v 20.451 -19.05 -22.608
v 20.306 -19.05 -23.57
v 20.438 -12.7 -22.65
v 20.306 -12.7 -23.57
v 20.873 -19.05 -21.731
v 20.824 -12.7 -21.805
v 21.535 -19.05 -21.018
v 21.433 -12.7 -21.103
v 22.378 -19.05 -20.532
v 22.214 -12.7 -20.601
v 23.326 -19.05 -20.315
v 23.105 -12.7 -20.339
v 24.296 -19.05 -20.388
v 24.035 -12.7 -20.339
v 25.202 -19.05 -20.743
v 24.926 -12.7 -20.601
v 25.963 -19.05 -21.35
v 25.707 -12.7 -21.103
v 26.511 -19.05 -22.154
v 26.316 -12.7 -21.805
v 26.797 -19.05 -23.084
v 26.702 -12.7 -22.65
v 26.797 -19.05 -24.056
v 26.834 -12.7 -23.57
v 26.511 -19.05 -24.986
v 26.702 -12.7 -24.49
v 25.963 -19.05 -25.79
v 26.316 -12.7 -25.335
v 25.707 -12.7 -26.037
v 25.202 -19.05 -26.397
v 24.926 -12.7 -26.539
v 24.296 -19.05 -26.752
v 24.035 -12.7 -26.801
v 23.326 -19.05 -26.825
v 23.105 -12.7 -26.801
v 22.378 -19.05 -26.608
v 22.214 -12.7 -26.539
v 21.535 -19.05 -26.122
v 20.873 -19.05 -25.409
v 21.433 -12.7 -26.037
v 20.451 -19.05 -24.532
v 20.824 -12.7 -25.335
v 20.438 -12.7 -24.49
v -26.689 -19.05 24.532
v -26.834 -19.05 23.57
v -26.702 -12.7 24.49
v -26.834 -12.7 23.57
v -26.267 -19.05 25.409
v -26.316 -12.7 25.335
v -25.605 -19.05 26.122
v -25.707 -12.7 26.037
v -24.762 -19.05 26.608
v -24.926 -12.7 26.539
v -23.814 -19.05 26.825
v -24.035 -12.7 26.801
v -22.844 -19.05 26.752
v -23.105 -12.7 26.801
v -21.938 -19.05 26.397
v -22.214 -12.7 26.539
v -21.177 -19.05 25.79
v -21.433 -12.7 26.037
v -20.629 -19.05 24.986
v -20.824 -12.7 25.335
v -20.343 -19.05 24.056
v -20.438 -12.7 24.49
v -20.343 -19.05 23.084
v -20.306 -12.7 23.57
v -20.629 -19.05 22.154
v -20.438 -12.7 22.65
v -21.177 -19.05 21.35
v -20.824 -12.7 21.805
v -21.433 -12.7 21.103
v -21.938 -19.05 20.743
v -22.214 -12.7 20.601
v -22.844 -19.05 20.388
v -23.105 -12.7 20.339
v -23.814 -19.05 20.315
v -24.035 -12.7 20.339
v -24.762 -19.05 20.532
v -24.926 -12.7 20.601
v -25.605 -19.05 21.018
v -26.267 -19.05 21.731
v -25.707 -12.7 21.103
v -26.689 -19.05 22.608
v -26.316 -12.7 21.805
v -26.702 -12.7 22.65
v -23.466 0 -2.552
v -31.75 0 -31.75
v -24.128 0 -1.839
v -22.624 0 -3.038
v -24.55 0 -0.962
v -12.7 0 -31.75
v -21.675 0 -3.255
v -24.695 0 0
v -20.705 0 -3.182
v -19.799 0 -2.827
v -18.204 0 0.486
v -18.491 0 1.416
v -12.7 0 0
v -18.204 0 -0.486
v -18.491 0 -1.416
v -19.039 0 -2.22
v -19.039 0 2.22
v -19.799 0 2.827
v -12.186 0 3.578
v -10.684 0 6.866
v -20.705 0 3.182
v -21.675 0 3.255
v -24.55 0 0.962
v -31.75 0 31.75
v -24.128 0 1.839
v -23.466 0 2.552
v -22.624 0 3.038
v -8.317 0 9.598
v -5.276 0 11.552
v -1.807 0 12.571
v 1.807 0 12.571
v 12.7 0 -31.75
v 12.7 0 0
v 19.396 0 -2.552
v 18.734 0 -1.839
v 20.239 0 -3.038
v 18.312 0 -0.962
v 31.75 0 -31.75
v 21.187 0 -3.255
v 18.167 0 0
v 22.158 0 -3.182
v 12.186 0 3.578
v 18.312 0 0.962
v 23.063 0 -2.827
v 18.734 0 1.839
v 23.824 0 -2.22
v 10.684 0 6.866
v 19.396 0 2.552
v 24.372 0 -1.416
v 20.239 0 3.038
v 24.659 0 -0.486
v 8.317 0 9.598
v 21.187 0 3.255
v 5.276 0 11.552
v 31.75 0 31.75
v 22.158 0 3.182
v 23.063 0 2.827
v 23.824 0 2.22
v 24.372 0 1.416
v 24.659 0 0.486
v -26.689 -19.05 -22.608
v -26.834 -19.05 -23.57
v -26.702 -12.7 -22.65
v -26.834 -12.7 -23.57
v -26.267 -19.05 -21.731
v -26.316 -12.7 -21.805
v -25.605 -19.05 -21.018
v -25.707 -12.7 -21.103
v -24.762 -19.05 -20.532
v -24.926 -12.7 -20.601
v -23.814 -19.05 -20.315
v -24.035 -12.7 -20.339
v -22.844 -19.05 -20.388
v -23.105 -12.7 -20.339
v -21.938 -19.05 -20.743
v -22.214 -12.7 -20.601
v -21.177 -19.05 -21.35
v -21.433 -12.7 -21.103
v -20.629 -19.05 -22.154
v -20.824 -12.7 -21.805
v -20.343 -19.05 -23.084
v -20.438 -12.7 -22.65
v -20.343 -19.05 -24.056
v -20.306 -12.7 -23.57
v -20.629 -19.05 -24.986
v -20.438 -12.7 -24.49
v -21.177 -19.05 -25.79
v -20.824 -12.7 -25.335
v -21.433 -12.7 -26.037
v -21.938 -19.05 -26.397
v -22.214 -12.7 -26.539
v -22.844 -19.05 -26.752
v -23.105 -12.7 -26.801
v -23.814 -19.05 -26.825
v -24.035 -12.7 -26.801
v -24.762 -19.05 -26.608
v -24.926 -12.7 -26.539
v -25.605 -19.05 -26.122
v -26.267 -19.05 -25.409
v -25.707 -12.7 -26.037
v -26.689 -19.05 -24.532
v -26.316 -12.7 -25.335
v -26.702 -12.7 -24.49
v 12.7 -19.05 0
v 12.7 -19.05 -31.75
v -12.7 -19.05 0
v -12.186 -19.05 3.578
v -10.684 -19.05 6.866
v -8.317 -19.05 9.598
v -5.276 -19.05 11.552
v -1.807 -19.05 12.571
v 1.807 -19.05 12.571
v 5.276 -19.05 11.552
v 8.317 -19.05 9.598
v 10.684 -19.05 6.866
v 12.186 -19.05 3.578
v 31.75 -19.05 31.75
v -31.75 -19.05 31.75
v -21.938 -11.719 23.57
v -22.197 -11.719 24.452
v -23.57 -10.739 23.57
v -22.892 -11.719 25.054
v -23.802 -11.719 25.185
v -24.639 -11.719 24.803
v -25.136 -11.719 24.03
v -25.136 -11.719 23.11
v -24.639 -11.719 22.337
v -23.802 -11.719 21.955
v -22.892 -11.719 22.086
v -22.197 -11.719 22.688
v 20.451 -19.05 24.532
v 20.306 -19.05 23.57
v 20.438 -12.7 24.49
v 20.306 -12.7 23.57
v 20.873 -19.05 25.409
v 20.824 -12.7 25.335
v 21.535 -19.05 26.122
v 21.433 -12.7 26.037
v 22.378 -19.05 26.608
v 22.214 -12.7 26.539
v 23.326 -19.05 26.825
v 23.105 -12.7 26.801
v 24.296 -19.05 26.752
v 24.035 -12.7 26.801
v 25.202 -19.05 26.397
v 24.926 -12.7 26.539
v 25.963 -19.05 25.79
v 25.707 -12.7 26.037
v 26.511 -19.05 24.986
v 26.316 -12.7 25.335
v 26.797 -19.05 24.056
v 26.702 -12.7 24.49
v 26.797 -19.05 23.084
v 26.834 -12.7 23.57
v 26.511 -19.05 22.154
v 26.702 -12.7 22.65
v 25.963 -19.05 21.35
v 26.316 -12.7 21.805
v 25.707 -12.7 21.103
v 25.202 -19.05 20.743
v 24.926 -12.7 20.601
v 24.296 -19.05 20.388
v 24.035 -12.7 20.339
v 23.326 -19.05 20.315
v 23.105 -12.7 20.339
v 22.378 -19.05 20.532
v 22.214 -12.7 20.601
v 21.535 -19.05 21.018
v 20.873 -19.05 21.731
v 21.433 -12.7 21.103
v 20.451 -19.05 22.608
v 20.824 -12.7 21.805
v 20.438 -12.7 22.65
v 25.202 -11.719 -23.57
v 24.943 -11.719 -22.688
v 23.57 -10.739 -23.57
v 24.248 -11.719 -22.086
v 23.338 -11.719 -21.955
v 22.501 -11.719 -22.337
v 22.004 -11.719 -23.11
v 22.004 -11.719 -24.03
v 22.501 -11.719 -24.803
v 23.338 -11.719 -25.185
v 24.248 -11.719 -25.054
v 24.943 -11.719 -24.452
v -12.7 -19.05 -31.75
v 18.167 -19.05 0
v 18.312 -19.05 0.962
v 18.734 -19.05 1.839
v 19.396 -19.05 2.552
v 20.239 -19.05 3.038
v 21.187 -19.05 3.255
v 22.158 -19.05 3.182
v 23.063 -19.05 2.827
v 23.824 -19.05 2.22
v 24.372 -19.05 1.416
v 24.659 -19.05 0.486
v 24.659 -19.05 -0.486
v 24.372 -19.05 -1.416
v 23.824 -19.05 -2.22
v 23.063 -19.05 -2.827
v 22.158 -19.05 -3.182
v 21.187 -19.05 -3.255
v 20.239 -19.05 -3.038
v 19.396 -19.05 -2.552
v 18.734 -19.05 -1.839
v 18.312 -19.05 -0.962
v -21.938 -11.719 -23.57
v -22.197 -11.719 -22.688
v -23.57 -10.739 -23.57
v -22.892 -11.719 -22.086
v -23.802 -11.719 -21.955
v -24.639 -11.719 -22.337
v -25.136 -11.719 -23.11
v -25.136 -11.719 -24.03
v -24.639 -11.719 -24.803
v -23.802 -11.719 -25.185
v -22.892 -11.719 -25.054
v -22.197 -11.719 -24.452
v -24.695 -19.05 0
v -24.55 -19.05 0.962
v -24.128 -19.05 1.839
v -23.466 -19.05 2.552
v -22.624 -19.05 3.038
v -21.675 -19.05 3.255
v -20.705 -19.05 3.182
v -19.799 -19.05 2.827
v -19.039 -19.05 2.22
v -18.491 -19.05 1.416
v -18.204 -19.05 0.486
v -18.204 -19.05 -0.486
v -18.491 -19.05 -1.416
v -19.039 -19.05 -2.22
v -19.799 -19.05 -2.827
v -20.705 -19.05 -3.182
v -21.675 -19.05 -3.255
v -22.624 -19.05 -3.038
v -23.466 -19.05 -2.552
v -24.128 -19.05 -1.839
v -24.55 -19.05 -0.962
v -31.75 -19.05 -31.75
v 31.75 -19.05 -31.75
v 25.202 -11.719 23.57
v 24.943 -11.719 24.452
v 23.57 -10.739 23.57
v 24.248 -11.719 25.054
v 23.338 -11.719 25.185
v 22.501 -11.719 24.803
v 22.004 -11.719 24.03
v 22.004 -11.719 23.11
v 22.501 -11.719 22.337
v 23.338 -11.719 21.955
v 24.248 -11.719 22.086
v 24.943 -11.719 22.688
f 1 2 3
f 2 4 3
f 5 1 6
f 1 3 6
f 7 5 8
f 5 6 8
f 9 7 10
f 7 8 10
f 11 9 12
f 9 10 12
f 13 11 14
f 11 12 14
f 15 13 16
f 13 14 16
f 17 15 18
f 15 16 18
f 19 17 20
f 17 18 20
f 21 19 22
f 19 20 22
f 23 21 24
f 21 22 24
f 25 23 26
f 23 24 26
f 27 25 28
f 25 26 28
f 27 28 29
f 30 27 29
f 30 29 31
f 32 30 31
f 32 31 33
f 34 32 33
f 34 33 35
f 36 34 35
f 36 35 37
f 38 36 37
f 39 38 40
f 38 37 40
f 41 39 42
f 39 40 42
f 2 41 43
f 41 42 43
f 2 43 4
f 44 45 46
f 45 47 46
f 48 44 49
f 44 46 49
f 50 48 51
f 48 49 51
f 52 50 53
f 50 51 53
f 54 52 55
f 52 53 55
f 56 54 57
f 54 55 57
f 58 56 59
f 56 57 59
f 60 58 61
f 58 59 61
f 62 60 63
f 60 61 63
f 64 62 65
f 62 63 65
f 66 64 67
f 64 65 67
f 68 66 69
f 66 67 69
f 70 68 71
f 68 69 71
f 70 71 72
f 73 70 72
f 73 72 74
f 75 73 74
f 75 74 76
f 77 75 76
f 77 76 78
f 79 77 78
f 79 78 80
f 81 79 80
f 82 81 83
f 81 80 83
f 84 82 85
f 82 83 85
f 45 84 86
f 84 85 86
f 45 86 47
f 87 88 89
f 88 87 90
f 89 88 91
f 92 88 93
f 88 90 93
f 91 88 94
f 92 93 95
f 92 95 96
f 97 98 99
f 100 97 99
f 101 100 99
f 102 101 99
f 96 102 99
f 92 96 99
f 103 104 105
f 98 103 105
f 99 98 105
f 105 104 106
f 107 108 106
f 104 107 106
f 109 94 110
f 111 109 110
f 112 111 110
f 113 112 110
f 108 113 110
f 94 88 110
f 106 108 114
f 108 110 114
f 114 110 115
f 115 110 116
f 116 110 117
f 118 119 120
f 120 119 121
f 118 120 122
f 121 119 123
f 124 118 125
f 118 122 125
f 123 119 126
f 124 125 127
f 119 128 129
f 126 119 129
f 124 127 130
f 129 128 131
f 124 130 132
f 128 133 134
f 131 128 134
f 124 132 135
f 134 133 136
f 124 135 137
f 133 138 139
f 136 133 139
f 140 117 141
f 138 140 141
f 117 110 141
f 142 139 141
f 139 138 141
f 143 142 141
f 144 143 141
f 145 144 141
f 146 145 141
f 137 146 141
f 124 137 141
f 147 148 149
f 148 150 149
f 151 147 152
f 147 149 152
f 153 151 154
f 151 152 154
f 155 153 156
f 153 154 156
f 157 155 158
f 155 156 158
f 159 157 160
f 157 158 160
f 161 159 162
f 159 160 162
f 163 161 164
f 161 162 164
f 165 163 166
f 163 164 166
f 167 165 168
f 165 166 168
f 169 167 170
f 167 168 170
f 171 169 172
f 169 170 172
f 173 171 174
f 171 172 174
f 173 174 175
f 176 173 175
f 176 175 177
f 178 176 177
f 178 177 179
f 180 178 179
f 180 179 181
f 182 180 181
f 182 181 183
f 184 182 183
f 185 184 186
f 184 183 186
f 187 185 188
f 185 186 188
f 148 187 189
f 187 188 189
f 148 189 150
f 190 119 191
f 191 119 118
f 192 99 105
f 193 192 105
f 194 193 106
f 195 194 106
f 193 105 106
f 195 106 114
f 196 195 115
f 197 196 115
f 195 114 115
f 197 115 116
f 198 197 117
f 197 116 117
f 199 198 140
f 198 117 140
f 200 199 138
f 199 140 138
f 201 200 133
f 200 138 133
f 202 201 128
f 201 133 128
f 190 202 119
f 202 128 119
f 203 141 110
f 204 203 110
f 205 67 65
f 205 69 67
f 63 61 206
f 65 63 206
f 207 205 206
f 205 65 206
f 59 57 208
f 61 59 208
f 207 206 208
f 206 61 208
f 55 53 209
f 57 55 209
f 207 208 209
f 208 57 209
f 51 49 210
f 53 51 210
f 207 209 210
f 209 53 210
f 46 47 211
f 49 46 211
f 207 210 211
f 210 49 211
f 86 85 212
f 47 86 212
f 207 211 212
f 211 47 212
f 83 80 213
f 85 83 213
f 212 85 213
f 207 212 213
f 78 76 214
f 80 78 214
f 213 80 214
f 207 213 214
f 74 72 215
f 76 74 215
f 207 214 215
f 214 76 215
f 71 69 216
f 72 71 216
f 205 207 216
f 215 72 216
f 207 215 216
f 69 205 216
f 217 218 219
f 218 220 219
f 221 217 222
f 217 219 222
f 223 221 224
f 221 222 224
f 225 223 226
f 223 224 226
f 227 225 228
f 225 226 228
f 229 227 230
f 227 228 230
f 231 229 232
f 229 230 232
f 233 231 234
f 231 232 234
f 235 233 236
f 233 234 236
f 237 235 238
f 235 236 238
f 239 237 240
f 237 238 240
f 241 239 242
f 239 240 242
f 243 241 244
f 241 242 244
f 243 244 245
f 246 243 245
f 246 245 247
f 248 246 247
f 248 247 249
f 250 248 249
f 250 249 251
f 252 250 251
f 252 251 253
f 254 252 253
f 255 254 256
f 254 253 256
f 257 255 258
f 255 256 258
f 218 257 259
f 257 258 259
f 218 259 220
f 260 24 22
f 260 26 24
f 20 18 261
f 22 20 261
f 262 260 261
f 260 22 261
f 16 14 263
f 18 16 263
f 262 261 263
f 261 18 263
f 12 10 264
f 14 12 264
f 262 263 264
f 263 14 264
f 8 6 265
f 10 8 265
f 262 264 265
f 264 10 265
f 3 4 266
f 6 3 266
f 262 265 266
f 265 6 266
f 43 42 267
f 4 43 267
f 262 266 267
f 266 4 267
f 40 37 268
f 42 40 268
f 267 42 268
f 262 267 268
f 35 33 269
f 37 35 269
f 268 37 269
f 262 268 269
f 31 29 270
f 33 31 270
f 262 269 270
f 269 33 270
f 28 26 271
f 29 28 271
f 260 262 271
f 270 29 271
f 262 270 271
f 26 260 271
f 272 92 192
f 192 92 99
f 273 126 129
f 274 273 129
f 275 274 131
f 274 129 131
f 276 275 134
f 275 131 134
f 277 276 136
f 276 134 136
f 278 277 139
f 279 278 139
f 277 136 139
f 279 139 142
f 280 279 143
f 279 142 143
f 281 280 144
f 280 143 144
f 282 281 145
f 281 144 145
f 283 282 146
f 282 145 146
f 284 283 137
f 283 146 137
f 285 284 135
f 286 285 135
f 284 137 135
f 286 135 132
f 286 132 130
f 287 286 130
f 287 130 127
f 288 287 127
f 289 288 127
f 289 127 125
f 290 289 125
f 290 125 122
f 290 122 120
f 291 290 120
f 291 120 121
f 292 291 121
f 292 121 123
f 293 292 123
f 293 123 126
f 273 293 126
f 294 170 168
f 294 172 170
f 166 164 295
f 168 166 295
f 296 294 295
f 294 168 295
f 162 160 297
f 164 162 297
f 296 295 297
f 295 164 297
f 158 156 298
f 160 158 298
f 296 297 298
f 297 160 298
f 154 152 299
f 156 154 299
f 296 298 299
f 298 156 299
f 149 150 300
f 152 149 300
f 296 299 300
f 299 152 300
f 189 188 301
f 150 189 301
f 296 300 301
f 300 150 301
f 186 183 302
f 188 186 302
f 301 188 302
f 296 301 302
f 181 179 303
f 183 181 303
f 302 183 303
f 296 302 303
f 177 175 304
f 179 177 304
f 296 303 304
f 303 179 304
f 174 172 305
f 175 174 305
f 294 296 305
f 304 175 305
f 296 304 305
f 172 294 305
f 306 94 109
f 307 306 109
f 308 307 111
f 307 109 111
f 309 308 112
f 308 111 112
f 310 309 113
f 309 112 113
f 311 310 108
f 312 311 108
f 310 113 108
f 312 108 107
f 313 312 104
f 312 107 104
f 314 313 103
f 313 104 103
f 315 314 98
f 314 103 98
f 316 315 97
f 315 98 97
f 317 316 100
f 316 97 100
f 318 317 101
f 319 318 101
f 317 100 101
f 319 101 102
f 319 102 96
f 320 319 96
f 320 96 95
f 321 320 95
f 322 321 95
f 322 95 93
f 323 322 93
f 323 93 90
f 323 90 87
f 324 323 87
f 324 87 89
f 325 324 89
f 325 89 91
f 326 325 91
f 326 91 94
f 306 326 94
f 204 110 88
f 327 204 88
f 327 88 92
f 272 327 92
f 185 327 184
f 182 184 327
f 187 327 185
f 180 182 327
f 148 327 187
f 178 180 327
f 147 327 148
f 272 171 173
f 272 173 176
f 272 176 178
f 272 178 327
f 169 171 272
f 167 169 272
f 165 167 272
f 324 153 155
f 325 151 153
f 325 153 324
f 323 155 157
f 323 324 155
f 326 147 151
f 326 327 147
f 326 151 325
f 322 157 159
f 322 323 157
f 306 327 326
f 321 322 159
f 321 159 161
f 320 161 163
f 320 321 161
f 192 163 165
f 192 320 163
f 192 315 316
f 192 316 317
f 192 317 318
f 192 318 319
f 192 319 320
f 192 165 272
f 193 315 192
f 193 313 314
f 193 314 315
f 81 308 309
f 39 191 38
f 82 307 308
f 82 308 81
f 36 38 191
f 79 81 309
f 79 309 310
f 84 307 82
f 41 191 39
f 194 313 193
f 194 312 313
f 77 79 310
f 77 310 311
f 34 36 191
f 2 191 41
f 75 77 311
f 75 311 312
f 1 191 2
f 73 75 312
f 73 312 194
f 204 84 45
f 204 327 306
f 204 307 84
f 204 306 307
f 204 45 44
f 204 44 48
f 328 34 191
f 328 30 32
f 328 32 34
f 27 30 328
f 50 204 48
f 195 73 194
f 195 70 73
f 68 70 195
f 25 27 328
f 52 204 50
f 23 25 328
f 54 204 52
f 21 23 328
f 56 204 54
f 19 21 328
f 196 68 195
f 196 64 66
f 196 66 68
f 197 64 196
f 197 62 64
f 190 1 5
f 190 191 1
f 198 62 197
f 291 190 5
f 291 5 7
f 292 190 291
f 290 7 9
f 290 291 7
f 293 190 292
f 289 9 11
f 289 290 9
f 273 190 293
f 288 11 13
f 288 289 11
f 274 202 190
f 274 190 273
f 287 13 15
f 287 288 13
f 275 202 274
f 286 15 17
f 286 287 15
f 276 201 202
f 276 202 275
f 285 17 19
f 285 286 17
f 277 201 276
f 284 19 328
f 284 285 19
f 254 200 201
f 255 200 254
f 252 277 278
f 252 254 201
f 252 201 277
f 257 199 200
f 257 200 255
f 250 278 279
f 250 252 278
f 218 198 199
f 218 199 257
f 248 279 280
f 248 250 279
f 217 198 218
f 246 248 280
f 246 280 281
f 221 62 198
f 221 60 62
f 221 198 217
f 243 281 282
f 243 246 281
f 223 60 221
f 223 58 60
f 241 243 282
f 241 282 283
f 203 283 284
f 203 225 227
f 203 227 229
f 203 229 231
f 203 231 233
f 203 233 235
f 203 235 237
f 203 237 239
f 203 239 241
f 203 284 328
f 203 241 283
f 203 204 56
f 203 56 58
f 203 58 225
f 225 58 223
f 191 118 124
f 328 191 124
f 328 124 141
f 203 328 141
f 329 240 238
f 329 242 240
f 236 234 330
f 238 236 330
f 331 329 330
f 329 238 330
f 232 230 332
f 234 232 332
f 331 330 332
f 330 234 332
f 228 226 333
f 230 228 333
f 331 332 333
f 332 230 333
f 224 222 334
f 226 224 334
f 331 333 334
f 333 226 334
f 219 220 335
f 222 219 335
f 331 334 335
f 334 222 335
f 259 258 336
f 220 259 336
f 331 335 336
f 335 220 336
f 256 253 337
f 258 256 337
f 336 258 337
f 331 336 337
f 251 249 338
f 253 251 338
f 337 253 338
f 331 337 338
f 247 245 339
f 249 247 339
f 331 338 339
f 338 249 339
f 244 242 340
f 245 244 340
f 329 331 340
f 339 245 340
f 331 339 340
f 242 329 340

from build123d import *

# Parameters (mm, degrees)
F1_DEPTH = 19.05
F3_D     = 6.5278
F3_DEPTH = 6.35
F3_TIP   = 1.9611489744
F5_D     = 6.5278


with BuildPart() as f1:
    # F0 (on Front) → F1 (new body)
    with BuildSketch(Plane.XZ):
        with BuildLine():
            Line((31.75, 31.75), (-31.75, 31.75))
            Line((-31.75, 31.75), (-31.75, -31.75))
            Line((-31.75, -31.75), (-12.7, -31.75))
            Line((-12.7, -31.75), (-12.7, 0))
            ThreePointArc((-12.7, 0), (0, 12.7), (12.7, 0))
            Line((12.7, 0), (12.7, -31.75))
            Line((12.7, -31.75), (31.75, -31.75))
            Line((31.75, -31.75), (31.75, 31.75))
        make_face()
    extrude(amount=F1_DEPTH)

    # F3
    with Locations(Plane.XZ.offset(19.05)):
        with Locations((-23.57, 23.57), (-23.57, -23.57), (23.57, -23.57), (23.57, 23.57)):
            Hole(F3_D / 2, depth=F3_DEPTH)
            with Locations((0, 0, -(F3_DEPTH + F3_TIP / 2))):  # 118° drill point
                Cone(0, F3_D / 2, F3_TIP, mode=Mode.SUBTRACT)

    # F5 (through all)
    with Locations(Plane.XZ.offset(19.05)):
        with Locations((-21.43125, 0), (21.43125, 0)):
            Hole(F5_D / 2)


solid = f1.part
